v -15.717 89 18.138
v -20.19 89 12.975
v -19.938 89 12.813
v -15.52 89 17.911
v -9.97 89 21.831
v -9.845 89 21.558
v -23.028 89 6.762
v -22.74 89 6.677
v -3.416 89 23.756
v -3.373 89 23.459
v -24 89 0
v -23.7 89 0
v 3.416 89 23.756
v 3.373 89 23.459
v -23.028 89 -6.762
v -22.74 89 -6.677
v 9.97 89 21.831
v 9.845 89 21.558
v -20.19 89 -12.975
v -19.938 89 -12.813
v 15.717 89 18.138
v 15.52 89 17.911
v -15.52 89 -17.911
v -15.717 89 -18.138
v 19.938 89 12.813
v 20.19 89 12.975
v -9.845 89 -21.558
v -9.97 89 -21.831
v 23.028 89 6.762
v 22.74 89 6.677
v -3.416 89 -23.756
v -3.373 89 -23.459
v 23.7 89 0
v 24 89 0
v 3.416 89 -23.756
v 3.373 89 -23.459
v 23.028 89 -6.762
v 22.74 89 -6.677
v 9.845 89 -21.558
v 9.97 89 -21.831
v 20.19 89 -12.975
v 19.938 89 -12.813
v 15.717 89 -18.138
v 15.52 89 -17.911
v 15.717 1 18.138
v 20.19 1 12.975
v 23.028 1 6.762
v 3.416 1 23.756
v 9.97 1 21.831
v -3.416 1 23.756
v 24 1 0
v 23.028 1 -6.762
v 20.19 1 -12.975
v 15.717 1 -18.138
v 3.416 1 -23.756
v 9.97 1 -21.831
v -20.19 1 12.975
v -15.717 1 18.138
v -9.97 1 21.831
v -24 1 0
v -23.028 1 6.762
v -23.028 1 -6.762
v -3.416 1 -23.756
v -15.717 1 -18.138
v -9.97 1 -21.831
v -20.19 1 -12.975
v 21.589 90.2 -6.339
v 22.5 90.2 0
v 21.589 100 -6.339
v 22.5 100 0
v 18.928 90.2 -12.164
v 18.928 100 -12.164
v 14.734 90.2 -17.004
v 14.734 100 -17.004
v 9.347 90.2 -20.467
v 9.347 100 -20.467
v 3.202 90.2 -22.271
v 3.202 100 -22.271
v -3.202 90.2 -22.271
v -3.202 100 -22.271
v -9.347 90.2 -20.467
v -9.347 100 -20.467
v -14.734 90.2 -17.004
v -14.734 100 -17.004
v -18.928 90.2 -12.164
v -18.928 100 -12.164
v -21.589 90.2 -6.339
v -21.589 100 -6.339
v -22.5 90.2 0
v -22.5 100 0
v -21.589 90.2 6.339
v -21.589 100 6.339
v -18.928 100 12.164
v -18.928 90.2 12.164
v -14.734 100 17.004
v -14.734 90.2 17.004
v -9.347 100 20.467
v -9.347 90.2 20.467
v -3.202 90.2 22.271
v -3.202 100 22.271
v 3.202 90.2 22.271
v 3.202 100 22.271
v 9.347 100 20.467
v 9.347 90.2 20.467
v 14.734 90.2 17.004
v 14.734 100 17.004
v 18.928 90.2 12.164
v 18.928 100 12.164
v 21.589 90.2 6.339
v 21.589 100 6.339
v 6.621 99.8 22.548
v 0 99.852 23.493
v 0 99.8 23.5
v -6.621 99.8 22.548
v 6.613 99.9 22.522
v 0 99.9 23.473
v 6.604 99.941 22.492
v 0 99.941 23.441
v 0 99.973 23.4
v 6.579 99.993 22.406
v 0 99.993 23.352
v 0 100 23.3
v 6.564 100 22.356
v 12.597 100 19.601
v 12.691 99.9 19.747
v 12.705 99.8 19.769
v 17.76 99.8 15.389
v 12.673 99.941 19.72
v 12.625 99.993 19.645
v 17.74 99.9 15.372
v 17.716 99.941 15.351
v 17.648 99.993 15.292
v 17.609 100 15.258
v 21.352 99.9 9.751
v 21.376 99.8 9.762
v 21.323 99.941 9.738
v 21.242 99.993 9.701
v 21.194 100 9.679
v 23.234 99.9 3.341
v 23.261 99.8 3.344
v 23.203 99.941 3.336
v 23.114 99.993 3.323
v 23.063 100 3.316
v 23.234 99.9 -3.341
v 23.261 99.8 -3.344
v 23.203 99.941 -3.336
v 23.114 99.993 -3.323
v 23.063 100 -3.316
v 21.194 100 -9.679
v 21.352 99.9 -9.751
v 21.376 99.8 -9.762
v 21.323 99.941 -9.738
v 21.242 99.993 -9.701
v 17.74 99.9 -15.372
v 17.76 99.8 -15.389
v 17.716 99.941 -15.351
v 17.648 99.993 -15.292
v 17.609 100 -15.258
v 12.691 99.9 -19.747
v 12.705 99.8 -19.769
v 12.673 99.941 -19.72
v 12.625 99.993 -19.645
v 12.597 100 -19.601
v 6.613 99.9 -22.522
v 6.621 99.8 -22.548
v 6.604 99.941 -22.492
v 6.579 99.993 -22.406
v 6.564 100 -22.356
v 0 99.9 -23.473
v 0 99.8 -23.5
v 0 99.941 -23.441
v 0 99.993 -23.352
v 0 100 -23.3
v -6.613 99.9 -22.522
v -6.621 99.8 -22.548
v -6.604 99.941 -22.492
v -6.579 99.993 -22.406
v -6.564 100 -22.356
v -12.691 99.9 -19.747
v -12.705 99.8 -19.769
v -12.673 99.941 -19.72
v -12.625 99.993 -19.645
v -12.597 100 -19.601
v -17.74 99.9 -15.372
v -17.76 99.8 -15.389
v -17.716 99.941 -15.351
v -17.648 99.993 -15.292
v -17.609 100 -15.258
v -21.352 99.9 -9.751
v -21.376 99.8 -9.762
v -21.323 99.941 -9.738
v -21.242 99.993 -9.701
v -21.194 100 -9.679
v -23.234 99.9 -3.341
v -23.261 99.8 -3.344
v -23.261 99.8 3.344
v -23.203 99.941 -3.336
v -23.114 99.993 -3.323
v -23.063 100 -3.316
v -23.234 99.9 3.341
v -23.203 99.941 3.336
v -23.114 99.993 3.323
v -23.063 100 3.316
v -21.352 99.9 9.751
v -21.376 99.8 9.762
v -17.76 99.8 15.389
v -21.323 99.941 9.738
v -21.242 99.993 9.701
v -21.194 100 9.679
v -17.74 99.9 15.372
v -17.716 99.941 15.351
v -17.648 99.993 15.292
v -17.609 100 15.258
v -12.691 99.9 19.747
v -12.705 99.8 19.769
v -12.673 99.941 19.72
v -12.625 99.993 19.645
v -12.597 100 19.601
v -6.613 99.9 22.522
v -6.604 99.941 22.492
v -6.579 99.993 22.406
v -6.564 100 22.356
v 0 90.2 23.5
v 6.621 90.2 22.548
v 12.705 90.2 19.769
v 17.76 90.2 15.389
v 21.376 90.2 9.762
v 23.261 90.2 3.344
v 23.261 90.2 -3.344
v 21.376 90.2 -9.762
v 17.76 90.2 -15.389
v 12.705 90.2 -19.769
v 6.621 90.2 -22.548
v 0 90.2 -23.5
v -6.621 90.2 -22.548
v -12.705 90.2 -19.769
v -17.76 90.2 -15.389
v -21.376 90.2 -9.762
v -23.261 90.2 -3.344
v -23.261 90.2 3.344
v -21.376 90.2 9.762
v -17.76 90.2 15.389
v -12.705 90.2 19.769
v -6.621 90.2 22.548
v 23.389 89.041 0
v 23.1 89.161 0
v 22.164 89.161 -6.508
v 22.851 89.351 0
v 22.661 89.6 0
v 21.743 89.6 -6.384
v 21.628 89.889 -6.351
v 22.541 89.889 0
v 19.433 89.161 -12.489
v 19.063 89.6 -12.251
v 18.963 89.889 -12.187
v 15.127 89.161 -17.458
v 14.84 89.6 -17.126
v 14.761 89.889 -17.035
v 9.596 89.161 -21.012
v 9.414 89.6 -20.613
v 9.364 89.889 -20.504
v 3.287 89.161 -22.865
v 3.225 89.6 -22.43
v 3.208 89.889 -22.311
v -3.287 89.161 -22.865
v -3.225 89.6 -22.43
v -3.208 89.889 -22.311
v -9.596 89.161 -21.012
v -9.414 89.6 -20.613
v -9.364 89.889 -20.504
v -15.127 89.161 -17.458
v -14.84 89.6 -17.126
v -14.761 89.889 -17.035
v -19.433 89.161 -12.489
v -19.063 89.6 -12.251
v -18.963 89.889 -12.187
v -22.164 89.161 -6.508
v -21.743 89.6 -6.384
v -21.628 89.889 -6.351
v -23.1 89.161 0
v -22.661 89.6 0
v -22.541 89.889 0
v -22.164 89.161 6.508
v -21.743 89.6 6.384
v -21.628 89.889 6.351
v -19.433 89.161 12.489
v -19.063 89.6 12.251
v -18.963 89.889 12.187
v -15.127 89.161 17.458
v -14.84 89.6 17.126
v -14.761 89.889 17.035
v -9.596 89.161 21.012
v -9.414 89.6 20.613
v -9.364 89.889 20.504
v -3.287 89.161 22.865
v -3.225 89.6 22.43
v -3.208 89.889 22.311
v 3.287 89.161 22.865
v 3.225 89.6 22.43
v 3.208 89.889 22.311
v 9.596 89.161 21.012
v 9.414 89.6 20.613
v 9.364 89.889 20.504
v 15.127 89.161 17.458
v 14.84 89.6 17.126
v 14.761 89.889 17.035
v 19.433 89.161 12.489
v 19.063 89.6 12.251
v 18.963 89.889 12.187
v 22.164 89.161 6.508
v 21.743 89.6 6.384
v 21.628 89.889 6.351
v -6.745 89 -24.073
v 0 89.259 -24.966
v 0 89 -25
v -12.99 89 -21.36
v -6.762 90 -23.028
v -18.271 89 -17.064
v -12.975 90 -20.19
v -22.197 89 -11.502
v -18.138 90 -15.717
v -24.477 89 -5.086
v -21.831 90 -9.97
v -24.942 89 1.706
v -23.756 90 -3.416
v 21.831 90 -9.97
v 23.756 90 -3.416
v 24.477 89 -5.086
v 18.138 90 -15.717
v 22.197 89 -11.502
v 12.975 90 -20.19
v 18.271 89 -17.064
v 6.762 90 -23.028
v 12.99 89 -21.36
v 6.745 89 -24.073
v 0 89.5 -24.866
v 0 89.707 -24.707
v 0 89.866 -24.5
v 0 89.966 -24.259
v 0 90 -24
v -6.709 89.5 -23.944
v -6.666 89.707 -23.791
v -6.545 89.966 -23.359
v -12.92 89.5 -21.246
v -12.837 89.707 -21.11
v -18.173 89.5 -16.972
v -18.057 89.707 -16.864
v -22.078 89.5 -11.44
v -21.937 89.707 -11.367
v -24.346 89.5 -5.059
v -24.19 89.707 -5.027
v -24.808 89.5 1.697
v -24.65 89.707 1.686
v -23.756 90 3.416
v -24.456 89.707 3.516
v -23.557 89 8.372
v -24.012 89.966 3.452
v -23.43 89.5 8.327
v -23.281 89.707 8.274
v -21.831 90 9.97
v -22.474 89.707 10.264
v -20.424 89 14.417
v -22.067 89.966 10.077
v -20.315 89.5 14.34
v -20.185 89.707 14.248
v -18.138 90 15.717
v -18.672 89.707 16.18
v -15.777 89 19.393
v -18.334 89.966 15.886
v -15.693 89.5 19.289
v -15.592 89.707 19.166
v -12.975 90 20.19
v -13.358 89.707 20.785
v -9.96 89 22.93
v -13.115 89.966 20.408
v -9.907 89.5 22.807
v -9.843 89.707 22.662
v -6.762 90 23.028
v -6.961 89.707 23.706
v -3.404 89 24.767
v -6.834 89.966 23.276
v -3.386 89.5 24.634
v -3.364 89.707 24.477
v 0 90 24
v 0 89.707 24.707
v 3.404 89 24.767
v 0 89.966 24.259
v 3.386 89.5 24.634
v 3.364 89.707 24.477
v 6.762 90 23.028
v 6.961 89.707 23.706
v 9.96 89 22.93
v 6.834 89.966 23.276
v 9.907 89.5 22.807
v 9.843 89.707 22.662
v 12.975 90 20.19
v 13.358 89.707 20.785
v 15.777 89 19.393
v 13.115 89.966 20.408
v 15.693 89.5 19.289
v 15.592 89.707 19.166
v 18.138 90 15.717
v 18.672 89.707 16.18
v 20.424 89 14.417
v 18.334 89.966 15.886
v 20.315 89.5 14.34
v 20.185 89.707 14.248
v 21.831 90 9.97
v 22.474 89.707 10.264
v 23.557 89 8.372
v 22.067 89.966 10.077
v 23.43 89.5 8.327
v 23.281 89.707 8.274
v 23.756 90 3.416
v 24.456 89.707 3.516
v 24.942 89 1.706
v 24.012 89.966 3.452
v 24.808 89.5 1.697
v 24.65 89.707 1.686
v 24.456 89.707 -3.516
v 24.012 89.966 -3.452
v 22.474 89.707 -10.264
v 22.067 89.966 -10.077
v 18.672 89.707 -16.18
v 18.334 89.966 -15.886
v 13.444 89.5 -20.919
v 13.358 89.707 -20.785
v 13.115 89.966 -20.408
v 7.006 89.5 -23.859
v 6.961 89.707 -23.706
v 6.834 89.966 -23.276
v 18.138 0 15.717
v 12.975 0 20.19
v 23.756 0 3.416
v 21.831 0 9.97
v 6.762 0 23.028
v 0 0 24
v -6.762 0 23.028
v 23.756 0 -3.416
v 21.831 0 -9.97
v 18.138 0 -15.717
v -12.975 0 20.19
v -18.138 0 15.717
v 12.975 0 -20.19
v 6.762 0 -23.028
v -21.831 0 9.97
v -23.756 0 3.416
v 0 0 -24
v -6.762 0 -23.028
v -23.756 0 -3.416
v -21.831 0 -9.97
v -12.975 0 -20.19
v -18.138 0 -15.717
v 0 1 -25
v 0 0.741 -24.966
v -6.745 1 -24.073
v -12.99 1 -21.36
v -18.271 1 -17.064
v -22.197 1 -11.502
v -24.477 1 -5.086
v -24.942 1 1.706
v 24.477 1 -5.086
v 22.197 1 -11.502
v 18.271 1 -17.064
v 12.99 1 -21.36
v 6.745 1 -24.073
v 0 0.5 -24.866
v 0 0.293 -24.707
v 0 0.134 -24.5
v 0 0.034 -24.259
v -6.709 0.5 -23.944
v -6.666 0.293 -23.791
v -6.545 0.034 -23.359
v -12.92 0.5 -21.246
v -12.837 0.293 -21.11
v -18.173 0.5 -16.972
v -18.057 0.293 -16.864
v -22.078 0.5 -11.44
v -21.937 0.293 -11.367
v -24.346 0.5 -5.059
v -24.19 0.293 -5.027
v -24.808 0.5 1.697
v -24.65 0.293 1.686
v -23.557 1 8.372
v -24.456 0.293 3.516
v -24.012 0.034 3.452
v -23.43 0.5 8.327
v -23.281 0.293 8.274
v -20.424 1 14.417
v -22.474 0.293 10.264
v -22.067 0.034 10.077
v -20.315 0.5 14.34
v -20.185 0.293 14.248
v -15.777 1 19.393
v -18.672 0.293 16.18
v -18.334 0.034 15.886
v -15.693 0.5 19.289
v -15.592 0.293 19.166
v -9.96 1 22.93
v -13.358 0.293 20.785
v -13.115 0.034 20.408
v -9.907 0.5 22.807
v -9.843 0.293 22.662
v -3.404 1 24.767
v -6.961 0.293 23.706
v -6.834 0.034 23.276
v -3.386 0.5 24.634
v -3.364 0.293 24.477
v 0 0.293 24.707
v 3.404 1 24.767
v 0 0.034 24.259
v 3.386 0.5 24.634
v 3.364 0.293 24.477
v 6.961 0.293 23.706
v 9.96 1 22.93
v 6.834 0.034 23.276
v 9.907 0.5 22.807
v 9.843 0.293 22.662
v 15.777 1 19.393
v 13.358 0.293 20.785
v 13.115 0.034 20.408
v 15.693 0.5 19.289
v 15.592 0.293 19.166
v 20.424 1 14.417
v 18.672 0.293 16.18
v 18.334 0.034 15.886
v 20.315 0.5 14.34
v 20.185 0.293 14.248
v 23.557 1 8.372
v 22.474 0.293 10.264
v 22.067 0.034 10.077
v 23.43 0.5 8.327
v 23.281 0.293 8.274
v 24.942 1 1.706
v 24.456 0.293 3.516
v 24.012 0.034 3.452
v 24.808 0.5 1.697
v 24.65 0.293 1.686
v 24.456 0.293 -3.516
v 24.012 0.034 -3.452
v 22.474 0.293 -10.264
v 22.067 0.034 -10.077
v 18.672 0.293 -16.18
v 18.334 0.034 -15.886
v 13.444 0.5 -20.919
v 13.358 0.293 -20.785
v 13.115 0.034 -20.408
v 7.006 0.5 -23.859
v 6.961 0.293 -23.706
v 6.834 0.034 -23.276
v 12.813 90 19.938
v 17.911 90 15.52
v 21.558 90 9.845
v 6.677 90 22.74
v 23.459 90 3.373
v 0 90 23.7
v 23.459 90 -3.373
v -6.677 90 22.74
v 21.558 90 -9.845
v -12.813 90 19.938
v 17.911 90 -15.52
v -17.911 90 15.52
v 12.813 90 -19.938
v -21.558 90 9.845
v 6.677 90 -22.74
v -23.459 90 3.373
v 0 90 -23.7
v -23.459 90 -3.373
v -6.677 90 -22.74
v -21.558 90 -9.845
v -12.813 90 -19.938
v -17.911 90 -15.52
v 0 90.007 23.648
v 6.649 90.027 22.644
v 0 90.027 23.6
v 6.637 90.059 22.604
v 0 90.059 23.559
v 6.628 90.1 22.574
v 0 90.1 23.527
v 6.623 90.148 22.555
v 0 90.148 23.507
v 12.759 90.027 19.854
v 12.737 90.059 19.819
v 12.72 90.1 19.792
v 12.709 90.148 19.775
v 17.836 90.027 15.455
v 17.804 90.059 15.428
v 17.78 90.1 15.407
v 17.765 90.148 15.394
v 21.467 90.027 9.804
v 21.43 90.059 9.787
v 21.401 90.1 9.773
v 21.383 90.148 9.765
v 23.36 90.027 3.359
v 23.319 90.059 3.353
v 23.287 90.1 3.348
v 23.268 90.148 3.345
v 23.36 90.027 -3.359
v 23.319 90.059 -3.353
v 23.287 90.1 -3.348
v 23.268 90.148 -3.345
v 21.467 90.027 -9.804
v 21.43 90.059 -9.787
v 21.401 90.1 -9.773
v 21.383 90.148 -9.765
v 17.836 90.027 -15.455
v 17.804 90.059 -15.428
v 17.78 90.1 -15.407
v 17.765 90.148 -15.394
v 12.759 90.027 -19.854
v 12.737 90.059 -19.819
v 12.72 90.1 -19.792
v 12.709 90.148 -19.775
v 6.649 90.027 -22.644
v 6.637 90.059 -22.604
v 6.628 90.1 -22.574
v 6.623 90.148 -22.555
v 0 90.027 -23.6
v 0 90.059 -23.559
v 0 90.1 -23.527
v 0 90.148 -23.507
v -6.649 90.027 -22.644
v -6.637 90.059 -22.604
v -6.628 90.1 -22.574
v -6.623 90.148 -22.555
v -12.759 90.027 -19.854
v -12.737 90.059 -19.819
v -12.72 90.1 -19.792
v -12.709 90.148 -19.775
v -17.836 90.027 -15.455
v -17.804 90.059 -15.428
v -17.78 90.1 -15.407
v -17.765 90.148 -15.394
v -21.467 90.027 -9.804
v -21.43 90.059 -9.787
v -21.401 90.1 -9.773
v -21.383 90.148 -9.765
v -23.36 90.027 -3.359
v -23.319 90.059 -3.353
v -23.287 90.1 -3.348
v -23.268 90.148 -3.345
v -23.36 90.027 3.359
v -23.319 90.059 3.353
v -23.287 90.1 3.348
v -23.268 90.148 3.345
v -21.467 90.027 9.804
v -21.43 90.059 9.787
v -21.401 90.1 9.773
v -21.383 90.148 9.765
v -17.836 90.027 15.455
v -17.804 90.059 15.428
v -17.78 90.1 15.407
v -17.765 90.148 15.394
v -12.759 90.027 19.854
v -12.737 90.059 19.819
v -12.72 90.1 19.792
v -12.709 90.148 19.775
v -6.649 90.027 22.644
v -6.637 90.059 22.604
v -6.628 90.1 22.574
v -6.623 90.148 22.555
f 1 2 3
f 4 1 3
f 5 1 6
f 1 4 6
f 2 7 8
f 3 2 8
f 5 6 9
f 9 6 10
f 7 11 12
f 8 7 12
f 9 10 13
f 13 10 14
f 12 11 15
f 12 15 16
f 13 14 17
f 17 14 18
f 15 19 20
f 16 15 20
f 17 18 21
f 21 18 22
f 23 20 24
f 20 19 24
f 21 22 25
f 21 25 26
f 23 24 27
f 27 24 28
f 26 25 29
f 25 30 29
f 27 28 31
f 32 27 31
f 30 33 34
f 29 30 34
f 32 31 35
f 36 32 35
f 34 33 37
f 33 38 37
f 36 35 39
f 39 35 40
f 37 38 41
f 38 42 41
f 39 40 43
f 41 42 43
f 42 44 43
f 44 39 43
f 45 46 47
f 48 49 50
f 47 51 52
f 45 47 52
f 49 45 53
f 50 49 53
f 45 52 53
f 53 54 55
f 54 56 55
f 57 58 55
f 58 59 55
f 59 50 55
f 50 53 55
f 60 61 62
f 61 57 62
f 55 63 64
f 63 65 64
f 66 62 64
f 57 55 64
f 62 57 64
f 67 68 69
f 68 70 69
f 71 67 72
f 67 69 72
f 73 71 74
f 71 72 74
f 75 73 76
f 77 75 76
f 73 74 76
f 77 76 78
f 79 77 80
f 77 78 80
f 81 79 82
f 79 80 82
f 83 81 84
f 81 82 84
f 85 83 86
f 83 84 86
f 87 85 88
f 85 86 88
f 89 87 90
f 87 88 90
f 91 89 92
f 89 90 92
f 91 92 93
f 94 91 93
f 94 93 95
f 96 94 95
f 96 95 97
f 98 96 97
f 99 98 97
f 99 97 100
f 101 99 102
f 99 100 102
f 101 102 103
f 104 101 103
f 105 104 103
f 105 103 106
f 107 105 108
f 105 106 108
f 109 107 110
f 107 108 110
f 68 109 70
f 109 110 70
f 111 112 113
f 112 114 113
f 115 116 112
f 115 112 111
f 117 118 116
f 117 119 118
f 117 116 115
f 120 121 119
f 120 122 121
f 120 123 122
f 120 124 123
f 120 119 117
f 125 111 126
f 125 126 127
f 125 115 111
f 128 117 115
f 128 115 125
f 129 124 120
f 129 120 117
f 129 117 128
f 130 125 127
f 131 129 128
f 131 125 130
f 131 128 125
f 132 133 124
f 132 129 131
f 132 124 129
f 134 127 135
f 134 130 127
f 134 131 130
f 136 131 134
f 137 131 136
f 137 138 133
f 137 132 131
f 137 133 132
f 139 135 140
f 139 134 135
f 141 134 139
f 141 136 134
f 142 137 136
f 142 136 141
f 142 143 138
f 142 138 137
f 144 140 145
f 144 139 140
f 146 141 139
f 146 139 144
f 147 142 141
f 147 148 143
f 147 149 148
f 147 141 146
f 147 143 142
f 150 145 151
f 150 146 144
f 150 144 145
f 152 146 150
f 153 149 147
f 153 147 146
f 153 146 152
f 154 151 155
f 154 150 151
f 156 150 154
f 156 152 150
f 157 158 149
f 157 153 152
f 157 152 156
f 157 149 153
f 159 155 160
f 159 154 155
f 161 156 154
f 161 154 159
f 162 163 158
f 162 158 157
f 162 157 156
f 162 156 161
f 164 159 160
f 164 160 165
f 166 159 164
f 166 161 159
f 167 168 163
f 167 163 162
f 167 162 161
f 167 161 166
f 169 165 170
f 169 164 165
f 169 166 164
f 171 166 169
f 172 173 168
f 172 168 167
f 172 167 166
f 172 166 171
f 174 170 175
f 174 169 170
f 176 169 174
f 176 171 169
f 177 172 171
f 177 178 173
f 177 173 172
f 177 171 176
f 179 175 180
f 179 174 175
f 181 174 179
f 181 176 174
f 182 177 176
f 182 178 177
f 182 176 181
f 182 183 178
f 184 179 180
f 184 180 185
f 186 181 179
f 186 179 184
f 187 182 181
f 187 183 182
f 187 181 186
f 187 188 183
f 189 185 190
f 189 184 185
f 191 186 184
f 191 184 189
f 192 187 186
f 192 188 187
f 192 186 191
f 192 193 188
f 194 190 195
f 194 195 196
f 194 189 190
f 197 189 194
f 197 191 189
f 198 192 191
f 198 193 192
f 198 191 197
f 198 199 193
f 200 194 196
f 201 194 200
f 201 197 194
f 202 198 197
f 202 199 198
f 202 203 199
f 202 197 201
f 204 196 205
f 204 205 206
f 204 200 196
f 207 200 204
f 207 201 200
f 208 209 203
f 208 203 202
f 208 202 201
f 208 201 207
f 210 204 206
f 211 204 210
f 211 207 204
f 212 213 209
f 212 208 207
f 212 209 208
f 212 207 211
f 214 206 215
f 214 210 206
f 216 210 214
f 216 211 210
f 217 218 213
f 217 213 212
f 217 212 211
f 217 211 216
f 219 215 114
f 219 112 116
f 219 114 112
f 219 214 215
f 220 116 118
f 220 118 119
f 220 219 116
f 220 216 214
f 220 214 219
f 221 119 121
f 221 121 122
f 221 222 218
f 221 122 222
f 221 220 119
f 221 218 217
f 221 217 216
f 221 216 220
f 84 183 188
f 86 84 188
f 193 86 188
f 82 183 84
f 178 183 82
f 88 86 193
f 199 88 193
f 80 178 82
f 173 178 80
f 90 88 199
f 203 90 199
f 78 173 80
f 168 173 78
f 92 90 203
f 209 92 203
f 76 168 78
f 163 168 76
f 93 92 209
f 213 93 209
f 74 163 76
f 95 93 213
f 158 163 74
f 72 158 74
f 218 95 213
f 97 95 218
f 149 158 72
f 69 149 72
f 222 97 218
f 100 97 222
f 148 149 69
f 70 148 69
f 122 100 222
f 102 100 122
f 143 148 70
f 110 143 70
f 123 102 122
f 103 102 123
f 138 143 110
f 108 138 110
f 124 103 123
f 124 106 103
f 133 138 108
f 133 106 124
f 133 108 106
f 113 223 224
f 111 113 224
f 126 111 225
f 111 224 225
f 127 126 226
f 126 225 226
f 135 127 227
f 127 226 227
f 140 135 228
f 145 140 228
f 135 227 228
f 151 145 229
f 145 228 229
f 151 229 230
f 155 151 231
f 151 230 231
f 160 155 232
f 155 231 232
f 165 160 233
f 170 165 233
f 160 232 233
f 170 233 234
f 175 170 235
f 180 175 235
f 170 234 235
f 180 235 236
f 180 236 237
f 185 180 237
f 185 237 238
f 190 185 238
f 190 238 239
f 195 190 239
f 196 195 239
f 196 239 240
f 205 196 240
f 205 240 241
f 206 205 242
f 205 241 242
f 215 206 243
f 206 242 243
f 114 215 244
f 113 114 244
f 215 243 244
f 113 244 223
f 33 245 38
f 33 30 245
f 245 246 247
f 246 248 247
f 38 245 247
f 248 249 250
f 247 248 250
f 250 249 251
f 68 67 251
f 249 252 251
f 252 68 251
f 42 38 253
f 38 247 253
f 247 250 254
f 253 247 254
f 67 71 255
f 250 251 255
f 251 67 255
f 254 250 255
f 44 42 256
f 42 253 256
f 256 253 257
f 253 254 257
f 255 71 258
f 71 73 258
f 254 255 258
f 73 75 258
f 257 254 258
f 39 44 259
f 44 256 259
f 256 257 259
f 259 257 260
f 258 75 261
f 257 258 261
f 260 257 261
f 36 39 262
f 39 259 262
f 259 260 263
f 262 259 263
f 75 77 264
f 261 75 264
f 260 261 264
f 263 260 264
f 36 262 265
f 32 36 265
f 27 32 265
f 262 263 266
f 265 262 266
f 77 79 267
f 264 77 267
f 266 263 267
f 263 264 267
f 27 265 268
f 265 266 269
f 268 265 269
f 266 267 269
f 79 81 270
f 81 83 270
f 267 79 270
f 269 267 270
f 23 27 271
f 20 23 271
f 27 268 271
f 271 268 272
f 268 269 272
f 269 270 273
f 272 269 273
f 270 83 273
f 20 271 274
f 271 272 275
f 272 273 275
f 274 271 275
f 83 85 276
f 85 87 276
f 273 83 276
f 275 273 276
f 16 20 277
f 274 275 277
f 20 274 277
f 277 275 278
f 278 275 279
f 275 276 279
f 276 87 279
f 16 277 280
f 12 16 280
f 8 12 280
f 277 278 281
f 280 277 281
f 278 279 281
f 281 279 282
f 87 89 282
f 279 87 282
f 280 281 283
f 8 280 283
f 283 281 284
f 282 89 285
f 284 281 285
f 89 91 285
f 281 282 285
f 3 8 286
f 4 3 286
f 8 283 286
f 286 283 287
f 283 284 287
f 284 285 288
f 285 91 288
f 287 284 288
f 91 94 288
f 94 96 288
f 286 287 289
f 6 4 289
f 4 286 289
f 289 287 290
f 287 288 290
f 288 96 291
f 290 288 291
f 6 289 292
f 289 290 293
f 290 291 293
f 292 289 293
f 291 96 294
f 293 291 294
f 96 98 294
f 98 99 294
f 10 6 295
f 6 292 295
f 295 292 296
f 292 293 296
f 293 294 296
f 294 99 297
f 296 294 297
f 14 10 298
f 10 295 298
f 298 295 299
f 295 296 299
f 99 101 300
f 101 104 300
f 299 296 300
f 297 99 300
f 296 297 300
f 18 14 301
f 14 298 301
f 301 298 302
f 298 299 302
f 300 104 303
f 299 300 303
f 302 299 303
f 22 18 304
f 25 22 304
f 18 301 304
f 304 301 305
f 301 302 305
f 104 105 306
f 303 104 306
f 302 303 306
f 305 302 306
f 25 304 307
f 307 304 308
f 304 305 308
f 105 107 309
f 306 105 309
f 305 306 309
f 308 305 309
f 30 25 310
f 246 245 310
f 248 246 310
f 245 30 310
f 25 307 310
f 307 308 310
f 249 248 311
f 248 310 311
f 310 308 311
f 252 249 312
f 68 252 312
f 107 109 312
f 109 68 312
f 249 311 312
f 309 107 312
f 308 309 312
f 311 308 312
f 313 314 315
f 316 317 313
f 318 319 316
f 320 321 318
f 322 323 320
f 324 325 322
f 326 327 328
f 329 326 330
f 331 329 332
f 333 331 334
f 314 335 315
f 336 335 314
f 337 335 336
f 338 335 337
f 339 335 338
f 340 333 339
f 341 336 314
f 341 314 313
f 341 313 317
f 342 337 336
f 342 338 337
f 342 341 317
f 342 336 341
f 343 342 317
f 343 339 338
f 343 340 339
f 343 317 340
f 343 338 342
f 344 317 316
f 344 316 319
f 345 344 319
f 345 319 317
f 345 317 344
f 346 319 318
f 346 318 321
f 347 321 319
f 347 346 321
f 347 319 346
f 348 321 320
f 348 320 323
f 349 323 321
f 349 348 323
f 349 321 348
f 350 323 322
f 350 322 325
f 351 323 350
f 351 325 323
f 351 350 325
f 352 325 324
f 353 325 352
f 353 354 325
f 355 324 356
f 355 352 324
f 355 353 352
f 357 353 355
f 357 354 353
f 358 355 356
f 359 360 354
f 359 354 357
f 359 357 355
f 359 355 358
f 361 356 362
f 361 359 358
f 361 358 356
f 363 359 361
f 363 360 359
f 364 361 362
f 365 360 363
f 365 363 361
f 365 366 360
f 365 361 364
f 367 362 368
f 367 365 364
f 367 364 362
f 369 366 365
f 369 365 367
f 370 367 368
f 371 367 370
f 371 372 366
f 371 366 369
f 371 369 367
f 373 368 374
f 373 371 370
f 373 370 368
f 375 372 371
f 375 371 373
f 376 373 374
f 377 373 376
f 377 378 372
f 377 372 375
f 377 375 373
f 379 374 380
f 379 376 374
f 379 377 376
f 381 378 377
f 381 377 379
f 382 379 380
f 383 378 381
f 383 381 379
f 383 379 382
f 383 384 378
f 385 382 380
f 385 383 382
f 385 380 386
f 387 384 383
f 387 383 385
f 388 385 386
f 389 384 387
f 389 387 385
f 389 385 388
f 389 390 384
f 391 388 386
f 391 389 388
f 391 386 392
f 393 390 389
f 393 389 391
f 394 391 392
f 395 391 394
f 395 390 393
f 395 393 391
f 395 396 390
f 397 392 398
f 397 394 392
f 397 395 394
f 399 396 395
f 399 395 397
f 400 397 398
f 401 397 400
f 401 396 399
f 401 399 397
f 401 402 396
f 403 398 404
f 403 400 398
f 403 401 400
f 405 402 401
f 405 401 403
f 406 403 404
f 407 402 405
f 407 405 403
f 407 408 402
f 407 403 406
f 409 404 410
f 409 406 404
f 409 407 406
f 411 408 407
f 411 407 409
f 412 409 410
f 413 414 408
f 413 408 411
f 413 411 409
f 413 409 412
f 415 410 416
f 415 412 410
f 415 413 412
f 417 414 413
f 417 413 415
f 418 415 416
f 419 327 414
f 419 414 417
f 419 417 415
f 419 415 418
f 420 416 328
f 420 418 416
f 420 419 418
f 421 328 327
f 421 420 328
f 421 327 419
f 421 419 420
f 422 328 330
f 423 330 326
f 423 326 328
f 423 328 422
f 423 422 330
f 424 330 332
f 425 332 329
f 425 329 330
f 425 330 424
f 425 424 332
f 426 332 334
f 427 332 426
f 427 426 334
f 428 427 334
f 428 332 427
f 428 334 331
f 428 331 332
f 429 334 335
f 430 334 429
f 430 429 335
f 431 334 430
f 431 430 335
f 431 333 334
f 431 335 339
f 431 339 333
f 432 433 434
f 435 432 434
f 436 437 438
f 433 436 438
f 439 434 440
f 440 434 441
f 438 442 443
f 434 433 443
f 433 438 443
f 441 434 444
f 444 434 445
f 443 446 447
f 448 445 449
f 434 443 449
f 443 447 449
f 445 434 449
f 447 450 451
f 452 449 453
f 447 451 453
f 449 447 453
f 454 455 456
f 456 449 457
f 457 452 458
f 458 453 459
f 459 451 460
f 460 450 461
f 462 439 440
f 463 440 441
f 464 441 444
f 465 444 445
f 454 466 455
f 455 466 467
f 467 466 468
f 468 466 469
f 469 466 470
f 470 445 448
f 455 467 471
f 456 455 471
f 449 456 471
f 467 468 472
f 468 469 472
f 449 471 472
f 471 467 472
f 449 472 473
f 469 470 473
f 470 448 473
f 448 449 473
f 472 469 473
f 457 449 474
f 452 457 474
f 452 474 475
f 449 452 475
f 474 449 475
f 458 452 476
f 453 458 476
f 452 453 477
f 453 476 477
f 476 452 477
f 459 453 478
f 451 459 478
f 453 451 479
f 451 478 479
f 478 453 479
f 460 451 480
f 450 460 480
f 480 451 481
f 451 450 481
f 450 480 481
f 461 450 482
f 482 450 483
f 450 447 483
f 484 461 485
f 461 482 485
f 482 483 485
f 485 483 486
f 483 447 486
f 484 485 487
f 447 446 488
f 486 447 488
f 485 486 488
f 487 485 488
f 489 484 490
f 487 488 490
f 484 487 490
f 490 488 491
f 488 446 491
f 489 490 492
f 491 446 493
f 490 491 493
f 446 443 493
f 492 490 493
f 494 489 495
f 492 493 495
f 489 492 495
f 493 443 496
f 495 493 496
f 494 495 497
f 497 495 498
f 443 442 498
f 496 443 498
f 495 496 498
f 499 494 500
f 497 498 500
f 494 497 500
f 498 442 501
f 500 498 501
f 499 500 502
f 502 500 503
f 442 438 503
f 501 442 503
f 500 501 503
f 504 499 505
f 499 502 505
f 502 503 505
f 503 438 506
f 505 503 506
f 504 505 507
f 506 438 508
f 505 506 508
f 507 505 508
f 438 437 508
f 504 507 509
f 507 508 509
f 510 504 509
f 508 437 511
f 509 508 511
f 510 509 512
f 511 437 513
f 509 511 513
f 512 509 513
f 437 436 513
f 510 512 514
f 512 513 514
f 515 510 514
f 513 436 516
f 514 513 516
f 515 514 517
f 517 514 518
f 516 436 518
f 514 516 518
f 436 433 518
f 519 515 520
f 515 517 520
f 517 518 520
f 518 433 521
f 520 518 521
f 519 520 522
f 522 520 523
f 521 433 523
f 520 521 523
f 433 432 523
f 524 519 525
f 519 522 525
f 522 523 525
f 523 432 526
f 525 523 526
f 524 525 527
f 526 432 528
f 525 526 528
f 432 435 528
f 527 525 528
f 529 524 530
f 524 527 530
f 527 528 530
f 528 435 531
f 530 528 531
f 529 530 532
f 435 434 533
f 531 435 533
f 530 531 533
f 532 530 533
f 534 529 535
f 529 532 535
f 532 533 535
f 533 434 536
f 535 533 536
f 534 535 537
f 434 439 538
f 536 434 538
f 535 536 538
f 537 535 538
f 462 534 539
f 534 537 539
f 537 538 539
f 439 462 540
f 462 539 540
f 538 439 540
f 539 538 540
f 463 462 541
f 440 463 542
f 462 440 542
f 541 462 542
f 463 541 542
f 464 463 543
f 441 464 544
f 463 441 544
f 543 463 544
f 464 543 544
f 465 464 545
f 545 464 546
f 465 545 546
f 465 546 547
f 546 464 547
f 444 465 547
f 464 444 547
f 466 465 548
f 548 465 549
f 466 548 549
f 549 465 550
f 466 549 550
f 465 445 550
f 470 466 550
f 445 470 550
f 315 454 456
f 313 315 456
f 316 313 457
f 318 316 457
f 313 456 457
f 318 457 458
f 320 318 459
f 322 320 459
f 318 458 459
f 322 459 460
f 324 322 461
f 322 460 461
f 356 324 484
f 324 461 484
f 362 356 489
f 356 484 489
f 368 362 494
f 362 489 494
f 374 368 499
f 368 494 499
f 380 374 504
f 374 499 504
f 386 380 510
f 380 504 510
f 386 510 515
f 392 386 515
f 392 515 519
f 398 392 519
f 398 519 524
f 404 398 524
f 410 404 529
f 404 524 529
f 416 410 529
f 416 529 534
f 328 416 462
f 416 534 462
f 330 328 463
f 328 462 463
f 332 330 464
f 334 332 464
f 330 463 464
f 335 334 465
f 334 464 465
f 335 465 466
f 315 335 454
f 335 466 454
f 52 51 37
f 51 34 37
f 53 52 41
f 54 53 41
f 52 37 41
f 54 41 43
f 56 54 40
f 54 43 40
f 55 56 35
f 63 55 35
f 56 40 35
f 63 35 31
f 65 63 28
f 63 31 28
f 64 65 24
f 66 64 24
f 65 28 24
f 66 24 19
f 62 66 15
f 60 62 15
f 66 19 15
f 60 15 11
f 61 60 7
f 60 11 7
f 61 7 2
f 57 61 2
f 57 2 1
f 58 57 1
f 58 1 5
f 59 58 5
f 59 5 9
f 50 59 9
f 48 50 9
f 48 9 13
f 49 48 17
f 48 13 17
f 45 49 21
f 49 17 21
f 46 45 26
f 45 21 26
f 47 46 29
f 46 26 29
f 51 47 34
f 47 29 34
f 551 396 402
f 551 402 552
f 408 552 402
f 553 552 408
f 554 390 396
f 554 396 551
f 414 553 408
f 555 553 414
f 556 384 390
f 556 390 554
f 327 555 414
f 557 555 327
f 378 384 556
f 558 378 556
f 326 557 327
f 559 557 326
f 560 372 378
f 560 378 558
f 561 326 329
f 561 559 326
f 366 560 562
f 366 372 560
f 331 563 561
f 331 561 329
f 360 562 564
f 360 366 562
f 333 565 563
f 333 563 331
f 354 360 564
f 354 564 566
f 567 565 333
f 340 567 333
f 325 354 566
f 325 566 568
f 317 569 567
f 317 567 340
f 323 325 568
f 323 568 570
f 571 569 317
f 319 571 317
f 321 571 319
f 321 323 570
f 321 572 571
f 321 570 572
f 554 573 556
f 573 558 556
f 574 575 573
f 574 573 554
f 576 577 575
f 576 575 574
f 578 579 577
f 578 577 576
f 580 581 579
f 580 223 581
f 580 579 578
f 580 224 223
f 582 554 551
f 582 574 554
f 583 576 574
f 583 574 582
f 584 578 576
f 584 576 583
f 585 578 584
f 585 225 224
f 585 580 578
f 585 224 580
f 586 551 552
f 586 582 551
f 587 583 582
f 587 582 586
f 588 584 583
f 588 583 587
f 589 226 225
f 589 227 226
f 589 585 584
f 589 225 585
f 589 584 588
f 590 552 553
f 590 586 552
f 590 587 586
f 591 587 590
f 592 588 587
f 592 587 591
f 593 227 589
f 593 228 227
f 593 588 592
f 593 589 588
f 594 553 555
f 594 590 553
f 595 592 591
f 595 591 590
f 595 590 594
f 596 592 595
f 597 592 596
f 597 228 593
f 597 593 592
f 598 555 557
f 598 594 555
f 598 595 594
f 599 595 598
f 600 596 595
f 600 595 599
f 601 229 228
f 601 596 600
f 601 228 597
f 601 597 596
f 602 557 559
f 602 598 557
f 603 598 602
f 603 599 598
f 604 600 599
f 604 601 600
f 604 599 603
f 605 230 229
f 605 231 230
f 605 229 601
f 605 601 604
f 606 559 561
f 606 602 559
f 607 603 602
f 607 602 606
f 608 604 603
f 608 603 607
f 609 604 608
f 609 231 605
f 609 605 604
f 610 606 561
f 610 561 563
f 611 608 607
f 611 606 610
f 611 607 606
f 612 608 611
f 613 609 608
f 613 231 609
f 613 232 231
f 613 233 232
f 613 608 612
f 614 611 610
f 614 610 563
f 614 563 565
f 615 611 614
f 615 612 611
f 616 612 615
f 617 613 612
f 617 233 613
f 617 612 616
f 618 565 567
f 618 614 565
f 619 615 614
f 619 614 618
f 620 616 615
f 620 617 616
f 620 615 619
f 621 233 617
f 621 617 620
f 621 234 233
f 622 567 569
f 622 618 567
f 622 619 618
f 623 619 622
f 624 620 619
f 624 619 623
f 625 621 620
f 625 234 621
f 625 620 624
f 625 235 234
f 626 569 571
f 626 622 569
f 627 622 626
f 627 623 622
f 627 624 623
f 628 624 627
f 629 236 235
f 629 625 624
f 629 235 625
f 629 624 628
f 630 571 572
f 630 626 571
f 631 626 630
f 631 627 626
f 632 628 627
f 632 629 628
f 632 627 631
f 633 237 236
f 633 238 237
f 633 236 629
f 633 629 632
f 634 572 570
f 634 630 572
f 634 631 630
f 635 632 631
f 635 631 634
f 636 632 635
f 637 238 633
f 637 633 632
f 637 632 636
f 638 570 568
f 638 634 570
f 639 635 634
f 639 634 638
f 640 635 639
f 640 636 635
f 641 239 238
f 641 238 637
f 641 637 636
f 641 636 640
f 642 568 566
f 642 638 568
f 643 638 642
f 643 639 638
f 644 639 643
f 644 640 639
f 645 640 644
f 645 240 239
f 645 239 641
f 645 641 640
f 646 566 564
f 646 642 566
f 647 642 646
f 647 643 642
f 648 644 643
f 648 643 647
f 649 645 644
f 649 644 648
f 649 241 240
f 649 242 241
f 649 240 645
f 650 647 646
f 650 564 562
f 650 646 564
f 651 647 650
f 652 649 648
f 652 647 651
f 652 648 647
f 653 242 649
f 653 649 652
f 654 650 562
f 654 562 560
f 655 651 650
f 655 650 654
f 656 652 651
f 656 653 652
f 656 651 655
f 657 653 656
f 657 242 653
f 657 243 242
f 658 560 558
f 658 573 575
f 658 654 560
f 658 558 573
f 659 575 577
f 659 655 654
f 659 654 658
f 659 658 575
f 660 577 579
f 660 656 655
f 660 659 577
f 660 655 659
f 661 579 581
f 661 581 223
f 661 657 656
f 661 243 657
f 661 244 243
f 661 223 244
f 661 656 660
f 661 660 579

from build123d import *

# Parameters (mm, degrees)
SKETCH1_R           = 25
BOSS_EXTRUDE1_DEPTH = 90
SKETCH2_R           = 23.5
BOSS_EXTRUDE2_DEPTH = 10
FILLET1_R           = 1
FILLET2_R           = 0.2


# Read off the part's stored shape, not the designer's step: Shell1
with BuildPart() as part:
    # Sketch1 → Boss-Extrude1 (new body)
    with BuildSketch(Plane(origin=(0, 0, 0), x_dir=(1, 0, 0), z_dir=(0, 1, 0))):
        with Locations(Location((0, 0, 0), (0, 0, 90))):
            Circle(SKETCH1_R)
    extrude(amount=BOSS_EXTRUDE1_DEPTH)

    # Sketch2 → Boss-Extrude2 (add)
    with BuildSketch(Plane(origin=(0, 90, 0), x_dir=(1, 0, 0), z_dir=(0, 1, 0))):
        with Locations(Location((0, 0, 0), (0, 0, 270))):
            Circle(SKETCH2_R)
    extrude(amount=BOSS_EXTRUDE2_DEPTH)

    # Fillet1
    fillet1_edges = [part.edges().sort_by_distance(p)[0] for p in [
        (0, 0, 25),
        (0, 90, 25),
    ]]
    fillet(fillet1_edges, radius=FILLET1_R)

    # Fillet2
    fillet2_edges = [part.edges().sort_by_distance(p)[0] for p in [
        (0, 90, -23.5),
        (0, 100, -23.5),
    ]]
    fillet(fillet2_edges, radius=FILLET2_R)

    # Shell1 outline → Shell1 (revolve, cut)
    with BuildSketch(Plane.XY):
        with BuildLine():
            Line((24, 1), (24, 89))
            Line((24, 89), (23.7, 89))
            ThreePointArc((23.7, 89), (22.851471863, 89.351471863), (22.5, 90.2))
            Line((22.5, 90.2), (22.5, 100))
            Line((22.5, 100), (0, 100))
            Line((0, 100), (0, 1))
            Line((0, 1), (24, 1))
        make_face()
    revolve(axis=Axis((0, 0, 0), (0, 1, 0)), mode=Mode.SUBTRACT)


solid = part.part
